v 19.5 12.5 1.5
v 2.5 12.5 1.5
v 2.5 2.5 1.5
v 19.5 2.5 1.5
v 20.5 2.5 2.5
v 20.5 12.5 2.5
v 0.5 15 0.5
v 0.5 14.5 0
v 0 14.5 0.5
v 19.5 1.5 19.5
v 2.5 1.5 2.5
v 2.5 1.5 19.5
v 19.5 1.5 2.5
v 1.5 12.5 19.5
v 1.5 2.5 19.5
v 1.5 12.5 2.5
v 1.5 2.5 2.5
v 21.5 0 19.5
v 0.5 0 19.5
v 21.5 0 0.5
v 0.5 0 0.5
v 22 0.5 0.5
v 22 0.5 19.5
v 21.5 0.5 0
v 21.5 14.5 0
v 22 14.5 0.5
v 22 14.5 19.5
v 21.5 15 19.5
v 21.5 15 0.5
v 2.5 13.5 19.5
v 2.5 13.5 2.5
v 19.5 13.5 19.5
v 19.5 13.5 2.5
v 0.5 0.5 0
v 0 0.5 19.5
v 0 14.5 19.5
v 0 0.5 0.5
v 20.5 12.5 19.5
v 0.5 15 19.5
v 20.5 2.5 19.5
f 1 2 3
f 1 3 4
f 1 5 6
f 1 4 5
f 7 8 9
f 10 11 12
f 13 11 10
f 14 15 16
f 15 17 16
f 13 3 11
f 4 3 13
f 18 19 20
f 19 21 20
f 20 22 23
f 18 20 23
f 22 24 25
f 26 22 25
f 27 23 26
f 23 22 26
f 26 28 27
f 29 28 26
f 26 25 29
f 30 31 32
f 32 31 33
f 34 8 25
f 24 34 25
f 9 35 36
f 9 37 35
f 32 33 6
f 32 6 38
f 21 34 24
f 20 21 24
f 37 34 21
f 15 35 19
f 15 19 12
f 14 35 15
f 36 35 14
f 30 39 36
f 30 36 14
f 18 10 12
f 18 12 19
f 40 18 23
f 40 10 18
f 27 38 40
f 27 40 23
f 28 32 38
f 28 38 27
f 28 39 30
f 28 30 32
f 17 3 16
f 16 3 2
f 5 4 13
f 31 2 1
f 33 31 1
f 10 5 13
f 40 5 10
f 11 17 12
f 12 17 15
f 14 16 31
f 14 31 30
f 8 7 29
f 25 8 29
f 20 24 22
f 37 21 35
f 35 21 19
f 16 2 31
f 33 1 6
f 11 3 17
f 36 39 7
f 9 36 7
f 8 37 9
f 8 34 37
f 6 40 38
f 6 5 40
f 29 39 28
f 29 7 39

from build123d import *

# Parameters (mm, degrees)
F0_W     = 22
F0_H     = 15
F1_DEPTH = 1.5
F2_W     = 22
F2_H     = 15
F2_W_2   = 19
F2_H_2   = 12
F3_DEPTH = 18
F4_SIZE  = 0.5
F5_SIZE  = 1


with BuildPart() as f1:
    # F0 (on Top) → F1 (new body)
    with BuildSketch(Plane.XY):
        with Locations((11, 7.5)):
            Rectangle(F0_W, F0_H)
    extrude(amount=F1_DEPTH)

    # F2 (on face) → F3 (join)
    with BuildSketch(Plane.XY.offset(1.5)):
        with Locations((11, 7.5)):
            Rectangle(F2_W, F2_H)
        with Locations((11, 7.5)):
            Rectangle(F2_W_2, F2_H_2, mode=Mode.SUBTRACT)
    extrude(amount=F3_DEPTH)

    # F4
    f4_edges = [f1.edges().sort_by_distance(p)[0] for p in [
        (0, 7.5, 0),
        (11, 0, 0),
        (22, 7.5, 0),
        (11, 15, 0),
        (22, 0, 9.75),
        (22, 15, 9.75),
        (0, 0, 9.75),
        (0, 15, 9.75),
    ]]
    chamfer(f4_edges, length=F4_SIZE)

    # F5
    f5_edges = [f1.edges().sort_by_distance(p)[0] for p in [
        (1.5, 7.5, 1.5),
        (11, 13.5, 1.5),
        (20.5, 7.5, 1.5),
        (11, 1.5, 1.5),
        (20.5, 13.5, 10.5),
        (1.5, 13.5, 10.5),
        (1.5, 1.5, 10.5),
        (20.5, 1.5, 10.5),
    ]]
    chamfer(f5_edges, length=F5_SIZE)


solid = f1.part
